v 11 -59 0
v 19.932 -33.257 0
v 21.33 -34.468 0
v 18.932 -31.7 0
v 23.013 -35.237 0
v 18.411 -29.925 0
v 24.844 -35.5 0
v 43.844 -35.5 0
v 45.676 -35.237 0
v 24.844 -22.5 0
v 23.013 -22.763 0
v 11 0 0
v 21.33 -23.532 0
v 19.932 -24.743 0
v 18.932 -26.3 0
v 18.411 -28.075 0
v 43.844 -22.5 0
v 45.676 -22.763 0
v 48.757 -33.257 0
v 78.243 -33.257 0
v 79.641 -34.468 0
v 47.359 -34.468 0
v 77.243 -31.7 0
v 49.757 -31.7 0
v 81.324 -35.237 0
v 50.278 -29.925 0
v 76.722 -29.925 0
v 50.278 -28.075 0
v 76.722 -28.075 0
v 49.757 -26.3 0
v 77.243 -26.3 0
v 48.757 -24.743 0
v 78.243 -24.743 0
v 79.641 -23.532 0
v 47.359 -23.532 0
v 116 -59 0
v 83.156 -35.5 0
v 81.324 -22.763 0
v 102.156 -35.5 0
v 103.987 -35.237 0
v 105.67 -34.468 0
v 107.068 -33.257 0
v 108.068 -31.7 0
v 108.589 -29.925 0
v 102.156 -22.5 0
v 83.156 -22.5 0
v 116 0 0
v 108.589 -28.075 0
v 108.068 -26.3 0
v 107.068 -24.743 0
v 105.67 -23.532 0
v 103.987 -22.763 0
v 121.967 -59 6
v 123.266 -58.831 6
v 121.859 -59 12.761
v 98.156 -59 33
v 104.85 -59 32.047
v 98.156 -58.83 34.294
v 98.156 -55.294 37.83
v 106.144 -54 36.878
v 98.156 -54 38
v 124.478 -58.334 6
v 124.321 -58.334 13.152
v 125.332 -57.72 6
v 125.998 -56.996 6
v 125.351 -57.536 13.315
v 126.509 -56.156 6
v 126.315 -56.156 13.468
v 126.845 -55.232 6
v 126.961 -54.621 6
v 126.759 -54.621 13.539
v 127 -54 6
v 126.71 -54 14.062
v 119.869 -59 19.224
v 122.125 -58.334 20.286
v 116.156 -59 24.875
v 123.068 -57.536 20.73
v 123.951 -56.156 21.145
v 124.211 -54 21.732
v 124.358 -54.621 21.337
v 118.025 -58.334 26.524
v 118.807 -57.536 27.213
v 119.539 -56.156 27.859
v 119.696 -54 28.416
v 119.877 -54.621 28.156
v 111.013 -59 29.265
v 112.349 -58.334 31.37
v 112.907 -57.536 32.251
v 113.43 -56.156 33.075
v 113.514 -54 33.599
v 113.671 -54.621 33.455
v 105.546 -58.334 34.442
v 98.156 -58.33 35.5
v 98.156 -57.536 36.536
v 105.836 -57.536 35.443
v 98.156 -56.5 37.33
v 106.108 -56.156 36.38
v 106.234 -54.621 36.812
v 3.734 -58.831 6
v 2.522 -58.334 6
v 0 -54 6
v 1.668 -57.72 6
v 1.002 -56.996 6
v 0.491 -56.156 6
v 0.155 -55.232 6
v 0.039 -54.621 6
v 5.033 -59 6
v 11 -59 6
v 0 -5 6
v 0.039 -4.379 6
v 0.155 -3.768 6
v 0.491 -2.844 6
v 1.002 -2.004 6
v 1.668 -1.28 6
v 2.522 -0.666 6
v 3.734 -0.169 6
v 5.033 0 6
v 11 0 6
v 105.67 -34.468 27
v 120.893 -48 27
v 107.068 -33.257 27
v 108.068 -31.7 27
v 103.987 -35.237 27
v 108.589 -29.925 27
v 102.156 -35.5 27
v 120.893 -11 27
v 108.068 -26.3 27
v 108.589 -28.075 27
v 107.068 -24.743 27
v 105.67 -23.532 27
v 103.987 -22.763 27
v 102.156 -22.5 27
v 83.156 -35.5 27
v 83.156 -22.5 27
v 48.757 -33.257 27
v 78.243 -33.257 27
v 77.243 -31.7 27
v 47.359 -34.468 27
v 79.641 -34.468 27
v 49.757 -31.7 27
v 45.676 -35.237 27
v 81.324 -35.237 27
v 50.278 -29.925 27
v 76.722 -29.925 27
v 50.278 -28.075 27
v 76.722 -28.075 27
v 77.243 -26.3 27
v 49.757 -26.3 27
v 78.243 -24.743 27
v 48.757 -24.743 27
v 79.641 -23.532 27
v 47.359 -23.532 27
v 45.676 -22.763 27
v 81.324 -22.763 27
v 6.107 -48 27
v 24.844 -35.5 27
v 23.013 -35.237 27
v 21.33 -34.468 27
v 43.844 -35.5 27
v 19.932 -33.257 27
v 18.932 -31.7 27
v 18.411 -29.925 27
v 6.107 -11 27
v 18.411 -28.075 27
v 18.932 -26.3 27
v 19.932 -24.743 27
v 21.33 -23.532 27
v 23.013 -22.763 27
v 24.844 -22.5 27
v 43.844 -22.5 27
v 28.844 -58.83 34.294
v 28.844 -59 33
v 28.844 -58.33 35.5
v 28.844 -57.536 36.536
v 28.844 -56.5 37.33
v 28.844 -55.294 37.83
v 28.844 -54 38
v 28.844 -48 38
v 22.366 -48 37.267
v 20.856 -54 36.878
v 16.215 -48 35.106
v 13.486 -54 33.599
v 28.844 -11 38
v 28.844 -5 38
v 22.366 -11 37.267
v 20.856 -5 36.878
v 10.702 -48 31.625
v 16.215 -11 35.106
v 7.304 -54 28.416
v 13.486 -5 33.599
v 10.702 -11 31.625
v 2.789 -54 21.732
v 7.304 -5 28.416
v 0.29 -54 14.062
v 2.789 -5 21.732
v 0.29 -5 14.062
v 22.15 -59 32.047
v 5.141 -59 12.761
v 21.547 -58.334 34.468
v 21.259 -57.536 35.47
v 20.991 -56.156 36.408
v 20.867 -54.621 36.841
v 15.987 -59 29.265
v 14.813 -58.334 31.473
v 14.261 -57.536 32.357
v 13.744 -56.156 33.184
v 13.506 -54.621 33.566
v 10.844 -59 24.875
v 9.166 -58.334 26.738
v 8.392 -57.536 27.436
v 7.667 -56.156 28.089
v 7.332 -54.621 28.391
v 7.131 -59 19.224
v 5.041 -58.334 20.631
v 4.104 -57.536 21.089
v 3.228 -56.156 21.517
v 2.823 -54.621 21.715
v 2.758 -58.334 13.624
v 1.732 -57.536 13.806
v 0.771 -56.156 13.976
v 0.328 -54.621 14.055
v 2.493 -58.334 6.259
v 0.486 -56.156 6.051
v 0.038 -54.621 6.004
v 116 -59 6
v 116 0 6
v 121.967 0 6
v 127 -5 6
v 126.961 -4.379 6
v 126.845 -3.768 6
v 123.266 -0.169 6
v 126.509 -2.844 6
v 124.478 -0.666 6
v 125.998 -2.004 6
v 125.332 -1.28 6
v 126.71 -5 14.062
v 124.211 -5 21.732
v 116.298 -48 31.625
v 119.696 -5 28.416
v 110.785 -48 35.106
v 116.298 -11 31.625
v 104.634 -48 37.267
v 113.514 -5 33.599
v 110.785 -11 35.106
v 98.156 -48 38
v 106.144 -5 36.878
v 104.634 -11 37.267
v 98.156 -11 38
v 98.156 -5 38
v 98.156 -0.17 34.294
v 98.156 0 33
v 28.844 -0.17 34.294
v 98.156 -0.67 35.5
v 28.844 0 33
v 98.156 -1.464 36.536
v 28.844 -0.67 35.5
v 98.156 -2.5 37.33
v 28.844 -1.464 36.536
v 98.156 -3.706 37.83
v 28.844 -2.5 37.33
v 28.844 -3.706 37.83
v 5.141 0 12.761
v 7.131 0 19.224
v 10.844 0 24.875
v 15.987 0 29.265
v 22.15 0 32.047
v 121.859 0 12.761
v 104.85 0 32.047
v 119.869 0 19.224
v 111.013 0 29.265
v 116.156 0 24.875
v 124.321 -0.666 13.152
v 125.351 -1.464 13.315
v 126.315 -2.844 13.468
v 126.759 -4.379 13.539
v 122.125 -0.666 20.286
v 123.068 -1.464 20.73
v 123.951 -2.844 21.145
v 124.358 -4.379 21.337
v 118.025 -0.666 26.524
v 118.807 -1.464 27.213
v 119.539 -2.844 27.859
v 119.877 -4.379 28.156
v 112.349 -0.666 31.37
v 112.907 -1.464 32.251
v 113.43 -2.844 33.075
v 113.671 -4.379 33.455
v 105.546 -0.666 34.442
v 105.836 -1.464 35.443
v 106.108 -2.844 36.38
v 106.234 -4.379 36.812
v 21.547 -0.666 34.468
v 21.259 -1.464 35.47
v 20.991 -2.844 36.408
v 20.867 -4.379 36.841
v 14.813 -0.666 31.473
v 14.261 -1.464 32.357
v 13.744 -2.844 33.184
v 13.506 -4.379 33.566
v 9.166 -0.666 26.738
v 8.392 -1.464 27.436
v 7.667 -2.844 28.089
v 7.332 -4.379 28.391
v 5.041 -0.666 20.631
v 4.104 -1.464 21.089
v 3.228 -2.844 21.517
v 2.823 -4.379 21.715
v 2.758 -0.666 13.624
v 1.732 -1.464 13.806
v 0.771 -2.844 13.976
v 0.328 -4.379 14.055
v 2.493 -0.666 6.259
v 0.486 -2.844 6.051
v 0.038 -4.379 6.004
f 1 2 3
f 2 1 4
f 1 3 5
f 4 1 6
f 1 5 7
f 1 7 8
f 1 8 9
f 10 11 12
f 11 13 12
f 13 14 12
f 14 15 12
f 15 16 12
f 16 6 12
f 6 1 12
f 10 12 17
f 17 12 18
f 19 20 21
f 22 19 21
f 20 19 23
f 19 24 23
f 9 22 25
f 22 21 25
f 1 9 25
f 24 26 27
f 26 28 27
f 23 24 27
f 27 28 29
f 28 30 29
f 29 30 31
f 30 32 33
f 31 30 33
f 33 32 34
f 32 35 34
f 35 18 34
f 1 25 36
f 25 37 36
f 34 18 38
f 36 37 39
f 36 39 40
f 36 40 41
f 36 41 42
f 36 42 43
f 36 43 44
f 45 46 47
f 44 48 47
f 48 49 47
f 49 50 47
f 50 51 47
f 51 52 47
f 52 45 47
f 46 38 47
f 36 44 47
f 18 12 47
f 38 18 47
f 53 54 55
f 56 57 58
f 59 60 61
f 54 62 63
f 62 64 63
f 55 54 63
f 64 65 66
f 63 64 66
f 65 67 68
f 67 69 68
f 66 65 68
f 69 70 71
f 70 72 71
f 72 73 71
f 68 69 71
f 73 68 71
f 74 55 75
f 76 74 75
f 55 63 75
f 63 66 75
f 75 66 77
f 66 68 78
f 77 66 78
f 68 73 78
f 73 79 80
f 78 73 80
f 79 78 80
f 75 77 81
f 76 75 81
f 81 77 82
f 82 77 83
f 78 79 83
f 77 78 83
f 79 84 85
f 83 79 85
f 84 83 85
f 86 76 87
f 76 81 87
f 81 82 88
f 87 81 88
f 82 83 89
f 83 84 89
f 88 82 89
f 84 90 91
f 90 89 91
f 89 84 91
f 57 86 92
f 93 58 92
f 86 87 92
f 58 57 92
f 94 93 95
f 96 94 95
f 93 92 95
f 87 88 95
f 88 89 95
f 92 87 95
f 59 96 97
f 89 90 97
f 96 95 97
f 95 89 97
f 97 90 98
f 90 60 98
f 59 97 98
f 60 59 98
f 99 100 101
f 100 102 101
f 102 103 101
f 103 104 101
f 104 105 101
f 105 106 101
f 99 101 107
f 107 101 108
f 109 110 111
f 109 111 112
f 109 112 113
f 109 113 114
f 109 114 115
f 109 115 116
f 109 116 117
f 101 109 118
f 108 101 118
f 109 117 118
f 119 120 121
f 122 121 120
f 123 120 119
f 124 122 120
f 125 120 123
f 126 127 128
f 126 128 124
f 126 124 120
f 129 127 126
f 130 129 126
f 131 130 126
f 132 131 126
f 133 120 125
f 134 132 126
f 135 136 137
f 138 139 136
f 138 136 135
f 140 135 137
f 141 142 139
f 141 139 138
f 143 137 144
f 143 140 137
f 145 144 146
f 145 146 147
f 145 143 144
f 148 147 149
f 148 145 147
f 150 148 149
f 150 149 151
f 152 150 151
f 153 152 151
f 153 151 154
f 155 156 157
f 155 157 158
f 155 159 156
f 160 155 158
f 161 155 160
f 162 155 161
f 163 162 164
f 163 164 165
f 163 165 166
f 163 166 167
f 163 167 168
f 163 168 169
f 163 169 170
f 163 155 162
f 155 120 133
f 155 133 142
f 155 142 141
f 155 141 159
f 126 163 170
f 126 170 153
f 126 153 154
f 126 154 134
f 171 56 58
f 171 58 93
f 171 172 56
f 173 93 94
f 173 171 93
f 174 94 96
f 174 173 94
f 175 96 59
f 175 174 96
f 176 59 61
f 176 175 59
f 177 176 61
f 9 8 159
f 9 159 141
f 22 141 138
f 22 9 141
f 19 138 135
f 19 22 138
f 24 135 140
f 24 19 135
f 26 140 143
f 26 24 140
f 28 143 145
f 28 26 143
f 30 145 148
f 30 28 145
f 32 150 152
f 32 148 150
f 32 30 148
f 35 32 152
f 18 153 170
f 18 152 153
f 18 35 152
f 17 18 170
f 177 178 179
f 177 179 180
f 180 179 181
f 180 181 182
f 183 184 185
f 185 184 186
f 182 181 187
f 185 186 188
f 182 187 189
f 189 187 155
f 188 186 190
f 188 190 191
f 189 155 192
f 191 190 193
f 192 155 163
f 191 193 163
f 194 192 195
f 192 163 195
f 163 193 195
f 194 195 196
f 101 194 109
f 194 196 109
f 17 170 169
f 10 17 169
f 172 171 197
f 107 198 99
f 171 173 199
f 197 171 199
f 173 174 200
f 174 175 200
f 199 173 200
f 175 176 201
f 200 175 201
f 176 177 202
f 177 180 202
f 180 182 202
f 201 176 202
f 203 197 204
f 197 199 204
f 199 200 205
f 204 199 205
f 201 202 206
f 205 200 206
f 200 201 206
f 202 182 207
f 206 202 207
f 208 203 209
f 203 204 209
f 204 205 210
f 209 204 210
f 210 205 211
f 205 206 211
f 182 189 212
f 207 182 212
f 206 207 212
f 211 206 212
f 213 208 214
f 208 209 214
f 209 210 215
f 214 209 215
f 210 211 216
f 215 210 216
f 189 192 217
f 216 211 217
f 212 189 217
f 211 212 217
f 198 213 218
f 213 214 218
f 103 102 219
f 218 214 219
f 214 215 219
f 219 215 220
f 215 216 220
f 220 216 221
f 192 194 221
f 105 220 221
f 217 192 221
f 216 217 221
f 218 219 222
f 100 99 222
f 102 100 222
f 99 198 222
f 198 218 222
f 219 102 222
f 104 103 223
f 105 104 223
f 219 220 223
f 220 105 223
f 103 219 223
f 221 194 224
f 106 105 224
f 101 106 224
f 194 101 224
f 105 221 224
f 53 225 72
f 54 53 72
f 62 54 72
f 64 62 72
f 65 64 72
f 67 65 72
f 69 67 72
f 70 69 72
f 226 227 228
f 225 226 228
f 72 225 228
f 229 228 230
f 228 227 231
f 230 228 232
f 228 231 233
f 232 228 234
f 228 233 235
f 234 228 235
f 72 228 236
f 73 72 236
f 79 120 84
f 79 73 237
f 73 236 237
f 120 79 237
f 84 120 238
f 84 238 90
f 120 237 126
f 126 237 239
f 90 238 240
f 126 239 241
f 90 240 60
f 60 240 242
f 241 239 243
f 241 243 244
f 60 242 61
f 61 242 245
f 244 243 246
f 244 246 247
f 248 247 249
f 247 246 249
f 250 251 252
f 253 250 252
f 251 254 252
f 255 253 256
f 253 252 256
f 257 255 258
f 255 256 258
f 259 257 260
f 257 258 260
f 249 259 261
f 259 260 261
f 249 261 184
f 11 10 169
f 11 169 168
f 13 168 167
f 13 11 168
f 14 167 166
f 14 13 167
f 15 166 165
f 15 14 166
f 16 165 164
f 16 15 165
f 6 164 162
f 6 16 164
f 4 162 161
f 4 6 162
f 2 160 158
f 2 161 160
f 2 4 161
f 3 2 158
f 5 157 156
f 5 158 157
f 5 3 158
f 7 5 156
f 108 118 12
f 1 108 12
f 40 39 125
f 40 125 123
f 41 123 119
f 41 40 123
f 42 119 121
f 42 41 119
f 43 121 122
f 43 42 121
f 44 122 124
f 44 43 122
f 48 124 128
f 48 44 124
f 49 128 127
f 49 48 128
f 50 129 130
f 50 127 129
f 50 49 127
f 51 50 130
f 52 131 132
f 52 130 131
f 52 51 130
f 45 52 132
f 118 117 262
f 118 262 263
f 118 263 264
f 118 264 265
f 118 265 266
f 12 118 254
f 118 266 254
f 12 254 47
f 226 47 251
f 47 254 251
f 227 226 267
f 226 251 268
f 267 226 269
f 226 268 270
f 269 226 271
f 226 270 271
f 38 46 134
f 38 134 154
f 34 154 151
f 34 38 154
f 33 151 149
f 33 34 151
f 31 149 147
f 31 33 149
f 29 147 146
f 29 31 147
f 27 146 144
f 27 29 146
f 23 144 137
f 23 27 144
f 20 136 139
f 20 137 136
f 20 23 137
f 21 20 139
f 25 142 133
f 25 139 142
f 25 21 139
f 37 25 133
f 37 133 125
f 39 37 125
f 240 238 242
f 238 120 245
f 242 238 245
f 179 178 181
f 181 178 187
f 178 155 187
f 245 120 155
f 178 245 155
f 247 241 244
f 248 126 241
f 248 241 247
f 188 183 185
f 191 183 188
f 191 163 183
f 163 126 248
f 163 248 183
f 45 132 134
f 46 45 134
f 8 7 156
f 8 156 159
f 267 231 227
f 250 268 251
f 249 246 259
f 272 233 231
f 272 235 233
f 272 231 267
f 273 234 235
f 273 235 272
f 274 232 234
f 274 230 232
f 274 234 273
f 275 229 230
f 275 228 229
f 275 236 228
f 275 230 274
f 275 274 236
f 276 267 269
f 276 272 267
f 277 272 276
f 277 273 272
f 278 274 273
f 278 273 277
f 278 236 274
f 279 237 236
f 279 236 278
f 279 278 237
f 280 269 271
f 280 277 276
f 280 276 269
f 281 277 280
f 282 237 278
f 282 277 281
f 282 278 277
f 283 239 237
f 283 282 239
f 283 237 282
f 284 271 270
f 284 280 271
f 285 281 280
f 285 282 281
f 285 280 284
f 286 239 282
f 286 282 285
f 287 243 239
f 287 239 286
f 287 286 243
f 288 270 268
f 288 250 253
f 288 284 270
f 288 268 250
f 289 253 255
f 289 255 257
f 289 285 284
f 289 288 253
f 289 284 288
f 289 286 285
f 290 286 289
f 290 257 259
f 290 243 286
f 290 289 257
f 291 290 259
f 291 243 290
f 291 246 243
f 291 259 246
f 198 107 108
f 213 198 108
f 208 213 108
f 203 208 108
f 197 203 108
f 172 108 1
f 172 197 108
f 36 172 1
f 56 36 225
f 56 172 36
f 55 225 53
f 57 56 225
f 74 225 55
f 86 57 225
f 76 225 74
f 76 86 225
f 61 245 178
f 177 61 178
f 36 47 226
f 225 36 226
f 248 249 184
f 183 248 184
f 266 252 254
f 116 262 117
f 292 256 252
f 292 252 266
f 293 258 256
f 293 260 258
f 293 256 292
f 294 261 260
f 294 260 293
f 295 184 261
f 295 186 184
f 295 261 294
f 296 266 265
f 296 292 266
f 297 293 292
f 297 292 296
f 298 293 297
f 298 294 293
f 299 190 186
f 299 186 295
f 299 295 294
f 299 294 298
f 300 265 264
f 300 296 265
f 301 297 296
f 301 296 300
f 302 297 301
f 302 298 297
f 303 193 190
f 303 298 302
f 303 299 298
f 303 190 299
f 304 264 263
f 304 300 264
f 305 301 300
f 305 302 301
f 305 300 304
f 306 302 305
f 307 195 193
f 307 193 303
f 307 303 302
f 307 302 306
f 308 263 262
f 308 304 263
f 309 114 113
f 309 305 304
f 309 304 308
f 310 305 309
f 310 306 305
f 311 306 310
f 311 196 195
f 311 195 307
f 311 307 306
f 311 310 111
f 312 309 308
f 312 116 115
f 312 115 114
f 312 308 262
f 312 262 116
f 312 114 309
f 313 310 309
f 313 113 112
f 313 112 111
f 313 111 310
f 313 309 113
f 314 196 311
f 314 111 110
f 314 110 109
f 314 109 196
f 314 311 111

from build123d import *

# Parameters (mm, degrees)
F1_DEPTH = 59
F2_W     = 37
F2_H     = 11
F3_DEPTH = 170
F5_DEPTH = 61.20861
F6_R     = 5


with BuildPart() as f1:
    # F0 (on Front) → F1 (new body)
    with BuildSketch(Plane.XZ):
        with BuildLine():
            Line((11, 6), (11, 0))
            Line((11, 0), (116, 0))
            Line((116, 0), (116, 6))
            Line((116, 6), (127, 6))
            ThreePointArc((127, 6), (119.696249, 28.416488), (98.15559, 38))
            Line((98.15559, 38), (28.84441, 38))
            ThreePointArc((28.84441, 38), (7.303751, 28.416488), (0, 6))
            Line((0, 6), (11, 6))
        make_face()
    extrude(amount=F1_DEPTH)

    # F2 (on Right) → F3 (cut)
    with BuildSketch(Plane.YZ):
        with Locations((-29.5, 32.5)):
            Rectangle(F2_W, F2_H)
    extrude(amount=F3_DEPTH, mode=Mode.SUBTRACT)

    # F4 (on Top) → F5 (cut)
    with BuildSketch(Plane.XY):
        with BuildLine():
            Line((43.84441, -22.5), (24.84441, -22.5))
            ThreePointArc((24.84441, -22.5), (18.34441, -29), (24.84441, -35.5))
            Line((24.84441, -35.5), (43.84441, -35.5))
            ThreePointArc((43.84441, -35.5), (50.34441, -29), (43.84441, -22.5))
        make_face()
        with BuildLine():
            Line((102.15559, -22.5), (83.15559, -22.5))
            ThreePointArc((83.15559, -22.5), (76.65559, -29), (83.15559, -35.5))
            Line((83.15559, -35.5), (102.15559, -35.5))
            ThreePointArc((102.15559, -35.5), (108.65559, -29), (102.15559, -22.5))
        make_face()
    extrude(amount=F5_DEPTH, mode=Mode.SUBTRACT)

    # F6
    f6_edges = [f1.edges().sort_by_distance(p)[0] for p in [
        (7.303751, -59, 28.416488),
        (7.303751, 0, 28.416488),
    ]]
    fillet(f6_edges, radius=F6_R)


solid = f1.part
